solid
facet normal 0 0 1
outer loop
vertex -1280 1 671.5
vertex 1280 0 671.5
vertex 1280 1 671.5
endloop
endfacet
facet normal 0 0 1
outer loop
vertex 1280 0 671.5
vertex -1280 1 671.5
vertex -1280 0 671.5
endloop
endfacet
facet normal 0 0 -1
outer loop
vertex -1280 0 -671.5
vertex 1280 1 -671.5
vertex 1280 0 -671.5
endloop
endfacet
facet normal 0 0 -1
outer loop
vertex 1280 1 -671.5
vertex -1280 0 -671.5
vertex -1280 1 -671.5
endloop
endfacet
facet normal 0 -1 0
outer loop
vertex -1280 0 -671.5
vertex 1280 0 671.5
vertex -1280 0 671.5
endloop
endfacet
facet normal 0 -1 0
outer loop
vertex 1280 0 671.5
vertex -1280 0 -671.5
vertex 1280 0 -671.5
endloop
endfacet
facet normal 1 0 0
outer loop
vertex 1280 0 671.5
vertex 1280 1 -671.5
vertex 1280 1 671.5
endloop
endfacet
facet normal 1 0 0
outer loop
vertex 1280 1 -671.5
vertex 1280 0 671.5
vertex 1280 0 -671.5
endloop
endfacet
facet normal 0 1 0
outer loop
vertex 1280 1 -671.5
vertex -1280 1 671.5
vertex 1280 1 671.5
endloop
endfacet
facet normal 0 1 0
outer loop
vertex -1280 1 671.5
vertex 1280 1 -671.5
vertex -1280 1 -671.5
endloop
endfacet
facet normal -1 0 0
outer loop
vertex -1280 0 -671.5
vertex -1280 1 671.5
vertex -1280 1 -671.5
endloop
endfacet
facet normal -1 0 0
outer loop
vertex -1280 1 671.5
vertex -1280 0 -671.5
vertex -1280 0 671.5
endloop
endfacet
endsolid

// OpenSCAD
// This script can be used to figure out the focal length
// that OpenScad will use when generating
// 2560 px wide generated images

// Generate an image with
// openscad --camera 0,0,0,90,0,0,3377.17 --imgsize 2560,1343 --colorscheme Nature -o 3377.17.png test.scad
// And see if the cube fills the image in the left/right direction or the top/down direction
// Treat the vertical direction separately from the horizontal direction.
// They will experience different truncation errors but land on the same mean value

width = 2560;
height = 1343;

translate([-width/2,0,-height/2])
cube([width,1,height]);
